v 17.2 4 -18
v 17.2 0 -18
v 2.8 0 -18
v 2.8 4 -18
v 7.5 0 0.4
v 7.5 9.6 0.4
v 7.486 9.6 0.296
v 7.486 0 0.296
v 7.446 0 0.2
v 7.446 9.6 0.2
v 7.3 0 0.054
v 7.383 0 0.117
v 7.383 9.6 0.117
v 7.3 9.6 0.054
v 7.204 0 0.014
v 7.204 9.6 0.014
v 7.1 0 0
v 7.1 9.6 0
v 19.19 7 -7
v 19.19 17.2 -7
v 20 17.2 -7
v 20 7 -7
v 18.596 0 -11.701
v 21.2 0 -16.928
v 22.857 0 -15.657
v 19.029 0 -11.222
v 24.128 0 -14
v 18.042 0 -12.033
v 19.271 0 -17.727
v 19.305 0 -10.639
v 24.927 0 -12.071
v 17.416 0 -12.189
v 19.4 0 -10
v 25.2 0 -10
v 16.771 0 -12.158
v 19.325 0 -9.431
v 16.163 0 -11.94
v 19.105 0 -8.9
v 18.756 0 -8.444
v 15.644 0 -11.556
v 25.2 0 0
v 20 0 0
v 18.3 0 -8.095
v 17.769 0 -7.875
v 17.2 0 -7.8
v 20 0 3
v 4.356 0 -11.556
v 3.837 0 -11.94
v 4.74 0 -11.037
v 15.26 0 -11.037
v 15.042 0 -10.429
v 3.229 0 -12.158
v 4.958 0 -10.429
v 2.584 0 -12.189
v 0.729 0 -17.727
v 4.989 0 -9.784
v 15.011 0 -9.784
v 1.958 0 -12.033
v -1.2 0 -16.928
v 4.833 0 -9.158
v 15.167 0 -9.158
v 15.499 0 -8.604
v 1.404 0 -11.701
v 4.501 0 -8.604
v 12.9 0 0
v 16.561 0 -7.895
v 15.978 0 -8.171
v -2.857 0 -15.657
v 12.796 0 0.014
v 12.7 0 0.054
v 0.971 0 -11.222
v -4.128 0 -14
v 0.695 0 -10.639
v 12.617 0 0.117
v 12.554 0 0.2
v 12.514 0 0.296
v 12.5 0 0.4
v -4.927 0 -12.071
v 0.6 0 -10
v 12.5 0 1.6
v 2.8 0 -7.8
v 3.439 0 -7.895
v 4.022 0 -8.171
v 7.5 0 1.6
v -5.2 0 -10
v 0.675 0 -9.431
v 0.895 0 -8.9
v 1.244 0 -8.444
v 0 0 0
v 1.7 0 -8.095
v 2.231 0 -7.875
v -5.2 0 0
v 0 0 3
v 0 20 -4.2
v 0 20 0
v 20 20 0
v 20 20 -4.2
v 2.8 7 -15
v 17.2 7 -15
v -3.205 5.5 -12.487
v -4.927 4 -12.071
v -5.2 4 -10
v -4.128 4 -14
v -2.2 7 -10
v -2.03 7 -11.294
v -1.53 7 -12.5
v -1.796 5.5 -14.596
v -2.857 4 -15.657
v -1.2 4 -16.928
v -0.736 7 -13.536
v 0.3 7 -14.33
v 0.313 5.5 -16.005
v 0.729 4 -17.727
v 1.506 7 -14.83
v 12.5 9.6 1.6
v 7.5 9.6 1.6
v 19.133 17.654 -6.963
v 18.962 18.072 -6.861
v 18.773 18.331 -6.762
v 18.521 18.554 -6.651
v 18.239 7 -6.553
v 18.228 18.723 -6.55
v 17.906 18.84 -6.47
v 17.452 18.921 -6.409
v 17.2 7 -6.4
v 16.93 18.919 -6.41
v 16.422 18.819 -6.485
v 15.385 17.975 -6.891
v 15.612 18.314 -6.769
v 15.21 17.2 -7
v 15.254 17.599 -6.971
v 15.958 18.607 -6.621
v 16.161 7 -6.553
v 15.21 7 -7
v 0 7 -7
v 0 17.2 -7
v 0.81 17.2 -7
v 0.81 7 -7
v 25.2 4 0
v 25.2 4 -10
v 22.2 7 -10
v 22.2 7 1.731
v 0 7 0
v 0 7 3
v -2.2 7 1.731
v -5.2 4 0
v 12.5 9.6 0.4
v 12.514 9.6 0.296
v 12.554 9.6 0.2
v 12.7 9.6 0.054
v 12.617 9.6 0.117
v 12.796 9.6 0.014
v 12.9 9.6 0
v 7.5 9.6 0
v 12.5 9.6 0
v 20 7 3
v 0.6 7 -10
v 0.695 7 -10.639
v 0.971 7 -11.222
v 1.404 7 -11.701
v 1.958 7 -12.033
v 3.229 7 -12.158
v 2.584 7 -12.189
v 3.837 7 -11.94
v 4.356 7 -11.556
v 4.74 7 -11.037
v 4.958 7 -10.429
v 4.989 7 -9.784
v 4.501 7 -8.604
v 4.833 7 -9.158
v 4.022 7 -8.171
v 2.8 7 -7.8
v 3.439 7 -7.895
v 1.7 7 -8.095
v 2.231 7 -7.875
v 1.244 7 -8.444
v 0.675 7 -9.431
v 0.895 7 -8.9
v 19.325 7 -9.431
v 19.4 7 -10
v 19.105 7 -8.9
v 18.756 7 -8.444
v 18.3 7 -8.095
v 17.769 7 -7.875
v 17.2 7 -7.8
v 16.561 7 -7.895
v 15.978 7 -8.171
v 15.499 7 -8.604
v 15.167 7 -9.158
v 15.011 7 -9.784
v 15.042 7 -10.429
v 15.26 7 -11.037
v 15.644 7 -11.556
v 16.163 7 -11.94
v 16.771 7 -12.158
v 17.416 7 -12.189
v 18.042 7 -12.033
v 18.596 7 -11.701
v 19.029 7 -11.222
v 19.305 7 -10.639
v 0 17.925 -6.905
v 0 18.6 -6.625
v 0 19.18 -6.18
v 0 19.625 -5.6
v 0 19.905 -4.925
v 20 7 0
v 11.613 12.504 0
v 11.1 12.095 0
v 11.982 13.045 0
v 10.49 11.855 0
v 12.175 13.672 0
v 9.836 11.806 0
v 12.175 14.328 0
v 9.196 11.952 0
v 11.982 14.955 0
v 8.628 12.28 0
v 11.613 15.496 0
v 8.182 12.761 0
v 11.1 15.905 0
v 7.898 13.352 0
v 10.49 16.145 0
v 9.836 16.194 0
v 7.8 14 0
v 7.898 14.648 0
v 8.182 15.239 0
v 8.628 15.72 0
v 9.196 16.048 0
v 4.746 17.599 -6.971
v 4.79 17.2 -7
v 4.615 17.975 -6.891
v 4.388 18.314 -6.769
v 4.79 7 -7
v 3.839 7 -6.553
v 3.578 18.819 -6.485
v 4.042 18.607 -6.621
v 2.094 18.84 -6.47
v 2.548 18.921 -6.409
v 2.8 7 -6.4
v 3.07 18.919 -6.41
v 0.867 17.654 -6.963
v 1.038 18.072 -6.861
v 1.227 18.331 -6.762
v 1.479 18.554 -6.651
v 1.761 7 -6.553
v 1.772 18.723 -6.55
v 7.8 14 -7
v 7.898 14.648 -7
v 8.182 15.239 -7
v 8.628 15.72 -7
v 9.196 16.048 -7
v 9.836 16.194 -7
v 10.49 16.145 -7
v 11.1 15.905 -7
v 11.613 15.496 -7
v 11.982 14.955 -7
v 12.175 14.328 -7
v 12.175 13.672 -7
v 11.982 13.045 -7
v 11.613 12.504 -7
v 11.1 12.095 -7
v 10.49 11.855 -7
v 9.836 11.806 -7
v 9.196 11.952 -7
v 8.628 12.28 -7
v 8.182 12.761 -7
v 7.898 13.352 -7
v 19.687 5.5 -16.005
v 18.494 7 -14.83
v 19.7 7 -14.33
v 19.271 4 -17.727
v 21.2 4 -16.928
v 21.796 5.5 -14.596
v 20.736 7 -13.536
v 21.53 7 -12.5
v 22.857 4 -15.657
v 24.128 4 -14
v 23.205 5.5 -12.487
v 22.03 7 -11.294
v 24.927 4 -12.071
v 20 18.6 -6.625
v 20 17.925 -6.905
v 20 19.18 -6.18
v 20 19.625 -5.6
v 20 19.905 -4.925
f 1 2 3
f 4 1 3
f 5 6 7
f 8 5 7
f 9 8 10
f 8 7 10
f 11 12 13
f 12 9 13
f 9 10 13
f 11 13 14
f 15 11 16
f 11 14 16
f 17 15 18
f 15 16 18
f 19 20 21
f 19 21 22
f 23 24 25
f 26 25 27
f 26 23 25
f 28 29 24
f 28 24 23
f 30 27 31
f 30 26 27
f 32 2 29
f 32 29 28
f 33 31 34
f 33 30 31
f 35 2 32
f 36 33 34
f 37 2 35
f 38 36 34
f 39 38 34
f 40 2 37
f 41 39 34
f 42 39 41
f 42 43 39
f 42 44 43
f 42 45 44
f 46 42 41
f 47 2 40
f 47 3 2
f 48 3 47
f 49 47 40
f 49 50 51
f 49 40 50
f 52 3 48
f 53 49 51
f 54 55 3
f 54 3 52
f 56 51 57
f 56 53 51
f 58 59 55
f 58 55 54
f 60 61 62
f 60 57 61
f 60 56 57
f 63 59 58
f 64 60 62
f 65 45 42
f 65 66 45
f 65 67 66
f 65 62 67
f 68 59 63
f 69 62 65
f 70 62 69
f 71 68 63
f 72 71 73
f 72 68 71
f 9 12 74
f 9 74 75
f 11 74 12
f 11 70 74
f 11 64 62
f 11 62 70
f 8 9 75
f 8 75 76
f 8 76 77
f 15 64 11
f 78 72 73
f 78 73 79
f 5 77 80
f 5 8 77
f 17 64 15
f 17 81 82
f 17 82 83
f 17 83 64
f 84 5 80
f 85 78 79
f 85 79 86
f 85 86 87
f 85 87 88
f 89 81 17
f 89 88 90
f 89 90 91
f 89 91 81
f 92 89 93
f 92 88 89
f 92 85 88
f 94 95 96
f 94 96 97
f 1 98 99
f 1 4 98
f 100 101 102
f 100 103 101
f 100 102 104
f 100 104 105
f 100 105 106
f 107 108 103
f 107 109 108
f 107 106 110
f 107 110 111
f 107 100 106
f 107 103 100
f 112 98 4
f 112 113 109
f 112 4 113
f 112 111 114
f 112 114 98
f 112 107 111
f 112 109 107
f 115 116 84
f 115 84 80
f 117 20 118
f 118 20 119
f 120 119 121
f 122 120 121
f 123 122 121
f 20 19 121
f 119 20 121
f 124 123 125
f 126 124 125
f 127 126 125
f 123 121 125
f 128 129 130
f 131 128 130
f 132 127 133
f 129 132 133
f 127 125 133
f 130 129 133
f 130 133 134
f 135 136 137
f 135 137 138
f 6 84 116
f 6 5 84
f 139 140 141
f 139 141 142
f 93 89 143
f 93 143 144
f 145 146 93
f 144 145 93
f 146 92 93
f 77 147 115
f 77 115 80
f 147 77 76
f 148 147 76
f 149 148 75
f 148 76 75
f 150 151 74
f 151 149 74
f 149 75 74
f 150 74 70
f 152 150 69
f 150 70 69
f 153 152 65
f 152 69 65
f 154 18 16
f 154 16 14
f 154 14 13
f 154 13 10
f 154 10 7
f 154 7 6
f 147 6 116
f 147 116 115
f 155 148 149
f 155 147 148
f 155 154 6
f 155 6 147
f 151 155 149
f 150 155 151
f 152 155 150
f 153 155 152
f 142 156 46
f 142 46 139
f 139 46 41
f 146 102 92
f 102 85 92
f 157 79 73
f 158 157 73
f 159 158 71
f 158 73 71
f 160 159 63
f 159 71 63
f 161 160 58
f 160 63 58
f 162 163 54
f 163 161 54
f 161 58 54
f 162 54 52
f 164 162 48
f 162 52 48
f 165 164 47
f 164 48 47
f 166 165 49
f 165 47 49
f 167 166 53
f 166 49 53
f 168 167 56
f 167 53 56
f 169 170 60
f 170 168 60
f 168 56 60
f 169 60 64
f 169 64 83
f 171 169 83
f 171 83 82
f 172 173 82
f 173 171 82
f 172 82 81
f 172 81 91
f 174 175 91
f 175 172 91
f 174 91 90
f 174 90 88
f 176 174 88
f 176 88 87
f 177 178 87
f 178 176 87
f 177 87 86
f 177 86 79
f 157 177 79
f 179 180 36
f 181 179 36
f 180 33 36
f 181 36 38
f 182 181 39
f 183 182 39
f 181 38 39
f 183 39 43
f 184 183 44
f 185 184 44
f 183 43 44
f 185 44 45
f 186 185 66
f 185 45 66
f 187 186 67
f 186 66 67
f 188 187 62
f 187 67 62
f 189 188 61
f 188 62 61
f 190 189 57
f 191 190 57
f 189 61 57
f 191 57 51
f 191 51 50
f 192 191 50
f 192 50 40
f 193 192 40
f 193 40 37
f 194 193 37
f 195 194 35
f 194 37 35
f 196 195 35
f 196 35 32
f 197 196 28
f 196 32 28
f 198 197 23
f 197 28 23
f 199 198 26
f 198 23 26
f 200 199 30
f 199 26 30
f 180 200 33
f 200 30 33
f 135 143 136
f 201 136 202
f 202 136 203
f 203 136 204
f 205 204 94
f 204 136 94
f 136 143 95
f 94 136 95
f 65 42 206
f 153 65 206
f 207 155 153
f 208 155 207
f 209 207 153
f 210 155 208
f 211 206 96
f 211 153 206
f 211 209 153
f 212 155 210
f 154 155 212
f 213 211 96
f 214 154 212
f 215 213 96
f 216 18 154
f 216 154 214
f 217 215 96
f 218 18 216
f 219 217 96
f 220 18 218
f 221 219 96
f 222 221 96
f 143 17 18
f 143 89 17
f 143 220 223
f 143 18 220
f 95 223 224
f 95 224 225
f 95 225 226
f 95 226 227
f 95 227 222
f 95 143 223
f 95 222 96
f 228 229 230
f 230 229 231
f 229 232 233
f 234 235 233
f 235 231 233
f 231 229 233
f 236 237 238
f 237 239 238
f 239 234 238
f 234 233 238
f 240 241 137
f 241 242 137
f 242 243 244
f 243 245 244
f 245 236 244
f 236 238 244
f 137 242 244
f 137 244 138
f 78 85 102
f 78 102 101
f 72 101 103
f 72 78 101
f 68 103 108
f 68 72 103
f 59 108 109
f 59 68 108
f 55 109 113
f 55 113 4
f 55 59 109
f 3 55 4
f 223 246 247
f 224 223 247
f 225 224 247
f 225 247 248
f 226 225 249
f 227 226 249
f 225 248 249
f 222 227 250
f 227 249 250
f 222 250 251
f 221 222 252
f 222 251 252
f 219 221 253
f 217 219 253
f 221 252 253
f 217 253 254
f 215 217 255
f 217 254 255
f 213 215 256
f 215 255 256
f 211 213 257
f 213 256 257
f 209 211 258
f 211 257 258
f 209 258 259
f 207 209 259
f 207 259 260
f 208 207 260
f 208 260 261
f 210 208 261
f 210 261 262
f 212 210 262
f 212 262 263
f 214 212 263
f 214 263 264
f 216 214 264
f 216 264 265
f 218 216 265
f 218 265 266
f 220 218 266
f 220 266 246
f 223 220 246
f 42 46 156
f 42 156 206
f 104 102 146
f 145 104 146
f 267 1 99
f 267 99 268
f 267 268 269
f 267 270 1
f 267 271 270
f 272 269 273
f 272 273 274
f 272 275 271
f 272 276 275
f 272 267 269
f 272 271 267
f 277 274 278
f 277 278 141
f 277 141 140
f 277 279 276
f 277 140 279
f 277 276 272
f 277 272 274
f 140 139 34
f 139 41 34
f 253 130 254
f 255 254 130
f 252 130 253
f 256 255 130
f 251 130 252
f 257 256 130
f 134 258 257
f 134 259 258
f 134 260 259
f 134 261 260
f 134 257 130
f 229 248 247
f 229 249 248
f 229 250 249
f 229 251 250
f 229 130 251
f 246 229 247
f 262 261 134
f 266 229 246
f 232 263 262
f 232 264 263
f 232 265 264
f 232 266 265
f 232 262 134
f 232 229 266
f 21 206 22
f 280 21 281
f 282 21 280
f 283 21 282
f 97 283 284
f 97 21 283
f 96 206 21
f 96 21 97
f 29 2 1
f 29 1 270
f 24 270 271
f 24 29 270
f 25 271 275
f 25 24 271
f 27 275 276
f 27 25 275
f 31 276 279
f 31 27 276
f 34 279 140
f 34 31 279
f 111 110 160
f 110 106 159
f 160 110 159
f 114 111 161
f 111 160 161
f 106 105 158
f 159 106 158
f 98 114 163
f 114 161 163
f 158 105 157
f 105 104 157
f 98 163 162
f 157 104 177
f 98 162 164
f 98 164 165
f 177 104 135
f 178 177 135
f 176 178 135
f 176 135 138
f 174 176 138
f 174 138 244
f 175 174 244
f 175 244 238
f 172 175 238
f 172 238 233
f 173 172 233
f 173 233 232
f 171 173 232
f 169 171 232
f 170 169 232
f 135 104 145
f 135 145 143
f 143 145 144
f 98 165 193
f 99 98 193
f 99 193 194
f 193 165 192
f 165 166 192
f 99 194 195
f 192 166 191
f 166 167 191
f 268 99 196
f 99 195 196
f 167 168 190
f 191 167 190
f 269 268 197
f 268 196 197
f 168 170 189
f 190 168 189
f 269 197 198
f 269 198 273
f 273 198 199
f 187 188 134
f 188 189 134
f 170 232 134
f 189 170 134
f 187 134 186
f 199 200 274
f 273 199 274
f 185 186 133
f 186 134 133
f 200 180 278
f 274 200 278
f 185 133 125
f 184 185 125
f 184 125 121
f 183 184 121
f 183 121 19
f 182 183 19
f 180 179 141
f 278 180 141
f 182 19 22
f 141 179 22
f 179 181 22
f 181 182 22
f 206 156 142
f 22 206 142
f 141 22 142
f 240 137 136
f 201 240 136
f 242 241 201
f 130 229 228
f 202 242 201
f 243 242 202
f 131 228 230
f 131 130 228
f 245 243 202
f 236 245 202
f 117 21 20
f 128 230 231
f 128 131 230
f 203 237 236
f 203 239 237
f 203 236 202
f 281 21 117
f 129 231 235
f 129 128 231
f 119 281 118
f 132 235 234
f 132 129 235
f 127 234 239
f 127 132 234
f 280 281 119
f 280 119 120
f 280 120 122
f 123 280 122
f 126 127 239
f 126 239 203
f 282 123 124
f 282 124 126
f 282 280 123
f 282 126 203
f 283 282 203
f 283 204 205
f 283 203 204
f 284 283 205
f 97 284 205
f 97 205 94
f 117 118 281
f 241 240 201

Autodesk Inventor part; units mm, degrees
ref_plane "YZ Plane" through (0, 0, 0) normal (1, 0, 0) x (0, 1, 0)
ref_plane "XZ Plane" through (0, 0, 0) normal (0, 1, 0) x (-1, 0, 0)
ref_plane "XY Plane" through (0, 0, 0) normal (0, 0, 1) x (1, 0, 0)
sketch "Sketch1" plane through (0, 0, 0) normal (1, 0, 0) x (0, 1, 0)
  line L0 (0, 0) -> (20, 0)
  line L1 (20, 0) -> (20, -7)
  line L2 (20, -7) -> (0, -7)
  line L3 (0, -7) -> (0, 0)
  dimension "d18" = 20
  dimension "d19" = 7
extrude "Extrusion1" add sketch "Sketch1" along normal blind 20
sketch "Sketch2" plane through (0, 8.5, -7) normal (0, 0, -1) x (-1, 0, 0)
  line L0 (0, 11.5) -> (0, 0) projected
  line L1 (0, 11.5) -> (-20, 11.5) projected
  line L2 (-20, 0) -> (-20, 11.5) projected
  line L3 (0, 0) -> (-20, 0) projected
  line L4 (0, 11.5) -> (-20, 11.5) projected
  line L5 (-10, 11.5) -> (-10, 5.5)
  circle A0 centre (-10, 5.5) radius 2.2
  line L6 (0, 11.5) -> (-20, 11.5) projected
  point P0 (0, -8.5)
  dimension "d6" = 6
  dimension "d7" = 4.4
extrude "Extrusion2" cut sketch "Sketch2" against normal through all contours A0
sketch "Sketch11" plane through (0, 0, -7) normal (0, -1, 0) x (1, 0, 0)
  line L0 (0, 0) -> (20, 0) projected
  line L1 (10, 0) -> (17.2, 0)
  line L2 (20, 7) -> (20, 0) projected
  arc A0 (17.2, -11) -> (25.2, -3) centre (17.2, -3) ccw
  line L3 (10, 0) -> (10, -11)
  line L4 (17.2, -11) -> (10, -11)
  line L5 (25.2, 7) -> (25.2, -3)
  circle A1 centre (17.2, -3) radius 2.2
  line L6 (0, 7) -> (20, 7) projected
  line L7 (25.2, 7) -> (20, 7)
  line L8 (20, 7) -> (20, 10)
  line L9 (20, 10) -> (25.2, 7)
  line L10 (17.2, -3) -> (17.2, 7)
  point P0 (13.4, 7)
  dimension "d58" = 7.2
  dimension "d66" = 4.4
  dimension "d72" = 3
  dimension "d73" = 10
  dimension "d75" = 8
extrude "Extrusion10" add sketch "Sketch11" against normal blind 7 contours L0 L2 L7 L5 A0 L4 L3 | L8 L9 L7
sketch "Sketch14" plane through (0, 7, -7) normal (0, 1, 0) x (1, 0, 0)
  circle A0 centre (17.2, 3) radius 2.2 projected
  circle A1 centre (17.2, 3) radius 3.6
  point P0 (0, -7)
  dimension "d76" = 7.2
extrude "Extrusion11" cut sketch "Sketch14" along normal through all
mirror "Mirror4" about plane through (10, 0, -18) normal (-1, 0, 0) of "Extrusion10", "Extrusion11"
fillet "Fillet3" radius 2.8 1 edges at (10, 20, -7)
chamfer "Chamfer1" distance 3 angle 45 5 edges at (10, 7, -18) (-2.8569, 7, -15.6569) (-5.2, 7, -5) (22.8569, 7, -15.6569) (25.2, 7, -5)
sketch "Sketch15" plane through (0, 20, 0) normal (0, 0, 1) x (1, 0, 0)
  circle A0 centre (10, -6) radius 2.2 projected
  line L0 (10, -6) -> (10, -10.4)
  line L1 (2.8, -20) -> (17.2, -20) projected
  line L2 (7.5, -10.4) -> (12.5, -10.4)
  line L3 (12.5, -10.4) -> (12.5, -20)
  line L4 (12.5, -20) -> (7.5, -20)
  line L5 (7.5, -20) -> (7.5, -10.4)
  point P0 (0, -20)
  dimension "d83" = 4.4
  dimension "d84" = 5
extrude "Extrusion12" add sketch "Sketch15" along normal blind 1.6 contours L2 L3 L1 L5
fillet "Fillet4" radius 0.4 2 edges at (12.5, 4.8, 0) (7.5, 4.8, 0)
properties part number "Ljoint"
